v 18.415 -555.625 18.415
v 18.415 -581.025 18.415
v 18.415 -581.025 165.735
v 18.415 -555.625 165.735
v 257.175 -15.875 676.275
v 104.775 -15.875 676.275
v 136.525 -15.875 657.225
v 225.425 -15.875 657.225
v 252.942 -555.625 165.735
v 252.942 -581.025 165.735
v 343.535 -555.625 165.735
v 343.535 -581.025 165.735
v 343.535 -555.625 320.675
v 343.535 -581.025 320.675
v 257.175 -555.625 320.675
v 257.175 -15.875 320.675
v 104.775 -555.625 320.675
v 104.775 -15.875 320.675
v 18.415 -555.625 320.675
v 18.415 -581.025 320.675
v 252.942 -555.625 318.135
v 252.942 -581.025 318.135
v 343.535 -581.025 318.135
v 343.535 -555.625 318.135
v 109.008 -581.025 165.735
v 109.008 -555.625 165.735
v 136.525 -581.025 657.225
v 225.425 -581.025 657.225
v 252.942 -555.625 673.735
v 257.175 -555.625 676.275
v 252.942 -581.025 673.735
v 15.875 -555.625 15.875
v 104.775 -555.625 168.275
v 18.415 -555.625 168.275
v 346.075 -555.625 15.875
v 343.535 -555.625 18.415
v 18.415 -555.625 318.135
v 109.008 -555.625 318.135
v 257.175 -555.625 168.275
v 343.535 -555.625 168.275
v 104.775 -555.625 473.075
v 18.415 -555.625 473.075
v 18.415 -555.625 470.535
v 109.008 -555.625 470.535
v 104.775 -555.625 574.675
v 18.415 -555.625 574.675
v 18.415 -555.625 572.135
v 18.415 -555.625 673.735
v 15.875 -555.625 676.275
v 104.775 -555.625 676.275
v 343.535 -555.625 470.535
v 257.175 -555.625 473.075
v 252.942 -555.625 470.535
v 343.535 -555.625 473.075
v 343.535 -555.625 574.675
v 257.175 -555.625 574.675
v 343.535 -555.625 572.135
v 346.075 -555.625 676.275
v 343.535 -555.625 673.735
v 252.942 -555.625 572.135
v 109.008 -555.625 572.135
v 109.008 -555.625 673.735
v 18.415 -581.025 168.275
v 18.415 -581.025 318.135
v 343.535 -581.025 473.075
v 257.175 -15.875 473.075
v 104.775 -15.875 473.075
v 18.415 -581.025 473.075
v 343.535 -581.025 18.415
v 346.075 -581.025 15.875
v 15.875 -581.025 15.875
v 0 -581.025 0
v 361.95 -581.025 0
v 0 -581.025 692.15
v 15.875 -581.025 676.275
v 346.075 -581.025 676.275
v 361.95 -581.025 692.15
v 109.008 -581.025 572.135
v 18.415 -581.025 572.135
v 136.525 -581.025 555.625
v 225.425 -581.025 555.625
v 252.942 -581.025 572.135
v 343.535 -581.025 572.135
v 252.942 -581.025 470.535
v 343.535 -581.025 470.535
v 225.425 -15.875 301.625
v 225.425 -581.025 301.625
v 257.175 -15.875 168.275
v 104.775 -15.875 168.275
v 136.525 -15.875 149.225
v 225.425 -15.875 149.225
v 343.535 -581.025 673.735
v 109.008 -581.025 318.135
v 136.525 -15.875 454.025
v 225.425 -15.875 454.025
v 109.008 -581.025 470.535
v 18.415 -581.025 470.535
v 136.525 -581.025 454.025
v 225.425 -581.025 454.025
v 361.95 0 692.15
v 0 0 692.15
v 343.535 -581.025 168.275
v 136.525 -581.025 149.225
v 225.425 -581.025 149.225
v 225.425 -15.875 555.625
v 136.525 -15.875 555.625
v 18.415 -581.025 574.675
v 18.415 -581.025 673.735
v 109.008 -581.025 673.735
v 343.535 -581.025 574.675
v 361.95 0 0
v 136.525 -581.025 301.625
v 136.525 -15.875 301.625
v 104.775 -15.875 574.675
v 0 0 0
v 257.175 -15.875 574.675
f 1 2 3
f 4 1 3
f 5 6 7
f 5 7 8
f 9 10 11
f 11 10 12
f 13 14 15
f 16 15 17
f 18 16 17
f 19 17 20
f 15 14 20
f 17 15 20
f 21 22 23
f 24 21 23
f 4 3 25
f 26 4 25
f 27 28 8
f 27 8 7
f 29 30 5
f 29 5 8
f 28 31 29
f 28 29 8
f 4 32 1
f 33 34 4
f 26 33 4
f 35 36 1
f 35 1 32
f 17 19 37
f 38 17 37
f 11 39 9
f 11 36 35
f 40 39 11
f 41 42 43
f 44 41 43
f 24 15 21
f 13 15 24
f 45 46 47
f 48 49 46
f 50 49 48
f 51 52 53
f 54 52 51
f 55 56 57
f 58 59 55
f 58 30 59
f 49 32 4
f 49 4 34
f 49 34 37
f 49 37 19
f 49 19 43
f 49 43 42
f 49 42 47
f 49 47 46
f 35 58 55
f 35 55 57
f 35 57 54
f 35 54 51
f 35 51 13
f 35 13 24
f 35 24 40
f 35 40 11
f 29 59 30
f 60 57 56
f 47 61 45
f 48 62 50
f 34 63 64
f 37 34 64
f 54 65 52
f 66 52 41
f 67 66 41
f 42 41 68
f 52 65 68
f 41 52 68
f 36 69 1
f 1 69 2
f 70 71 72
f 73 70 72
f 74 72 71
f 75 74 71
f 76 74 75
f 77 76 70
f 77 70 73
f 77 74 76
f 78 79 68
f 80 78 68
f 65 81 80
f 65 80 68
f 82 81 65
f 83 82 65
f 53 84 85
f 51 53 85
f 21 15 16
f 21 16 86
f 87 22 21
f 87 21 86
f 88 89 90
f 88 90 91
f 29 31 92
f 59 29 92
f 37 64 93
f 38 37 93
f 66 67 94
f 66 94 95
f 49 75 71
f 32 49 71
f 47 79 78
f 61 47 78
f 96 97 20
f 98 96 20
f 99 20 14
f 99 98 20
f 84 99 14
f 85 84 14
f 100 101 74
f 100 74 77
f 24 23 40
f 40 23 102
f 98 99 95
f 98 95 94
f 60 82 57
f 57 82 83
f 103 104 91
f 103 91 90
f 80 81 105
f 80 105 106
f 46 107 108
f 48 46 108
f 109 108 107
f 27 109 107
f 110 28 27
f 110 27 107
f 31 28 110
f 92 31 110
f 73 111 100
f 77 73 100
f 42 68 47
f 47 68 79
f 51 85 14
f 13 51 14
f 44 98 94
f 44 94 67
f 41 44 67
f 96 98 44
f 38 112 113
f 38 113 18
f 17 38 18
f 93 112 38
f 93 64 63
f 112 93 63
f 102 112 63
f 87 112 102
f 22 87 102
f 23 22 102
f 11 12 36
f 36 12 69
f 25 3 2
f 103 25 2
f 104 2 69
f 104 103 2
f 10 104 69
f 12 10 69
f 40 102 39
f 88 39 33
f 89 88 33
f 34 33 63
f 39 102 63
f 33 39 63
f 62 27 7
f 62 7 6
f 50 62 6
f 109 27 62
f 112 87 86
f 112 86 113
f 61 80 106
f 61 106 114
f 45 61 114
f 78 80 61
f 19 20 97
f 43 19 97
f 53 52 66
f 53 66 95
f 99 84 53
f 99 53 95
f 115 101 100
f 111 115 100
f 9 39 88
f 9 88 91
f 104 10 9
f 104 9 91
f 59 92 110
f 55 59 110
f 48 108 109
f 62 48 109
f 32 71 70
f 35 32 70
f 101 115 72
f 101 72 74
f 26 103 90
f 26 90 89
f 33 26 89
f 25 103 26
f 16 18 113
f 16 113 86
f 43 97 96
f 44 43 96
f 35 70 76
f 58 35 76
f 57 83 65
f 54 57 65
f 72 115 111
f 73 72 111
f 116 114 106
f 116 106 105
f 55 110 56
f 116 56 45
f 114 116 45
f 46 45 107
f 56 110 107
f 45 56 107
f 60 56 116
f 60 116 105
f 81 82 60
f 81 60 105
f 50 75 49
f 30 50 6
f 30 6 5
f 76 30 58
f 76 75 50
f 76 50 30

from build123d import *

# Parameters (mm, degrees)
F0_W     = 361.95
F0_H     = 692.15
F1_DEPTH = 581.025
F2_W     = 330.2
F2_H     = 660.4
F3_DEPTH = 565.15
F5_DEPTH = 565.15
F7_DEPTH = 25.4


# Not quite as in the source:
# - a feature names something its author has since deleted; it is built from what else it names


with BuildPart() as f1:
    # F0 (on Front) → F1 (new body)
    with BuildSketch(Plane.XZ):
        with Locations((180.975, 346.075)):
            Rectangle(F0_W, F0_H)
    extrude(amount=F1_DEPTH)

    # F2 (on face) → F3 (cut)
    with BuildSketch(Plane.XZ.offset(581.025)):
        with Locations((180.975, 346.075)):
            Rectangle(F2_W, F2_H)
    extrude(amount=-F3_DEPTH, mode=Mode.SUBTRACT)

    # F4 (on face) → F5 (join)
    with BuildSketch(Plane.XZ.offset(581.025)):
        Polygon((104.775, 168.275), (15.875, 168.275), (15.875, 15.875), (346.075, 15.875), (346.075, 168.275), (257.175, 168.275), (225.425, 149.225), (136.525, 149.225), align=None)
        Polygon((104.775, 676.275), (15.875, 676.275), (15.875, 574.675), (104.775, 574.675), (257.175, 574.675), (346.075, 574.675), (346.075, 676.275), (257.175, 676.275), (225.425, 657.225), (136.525, 657.225), align=None)
        Polygon((104.775, 574.675), (15.875, 574.675), (15.875, 473.075), (104.775, 473.075), (257.175, 473.075), (346.075, 473.075), (346.075, 574.675), (257.175, 574.675), (225.425, 555.625), (136.525, 555.625), align=None)
        Polygon((104.775, 473.075), (15.875, 473.075), (15.875, 320.675), (104.775, 320.675), (257.175, 320.675), (346.075, 320.675), (346.075, 473.075), (257.175, 473.075), (225.425, 454.025), (136.525, 454.025), align=None)
        Polygon((104.775, 320.675), (15.875, 320.675), (15.875, 168.275), (104.775, 168.275), (257.175, 168.275), (346.075, 168.275), (346.075, 320.675), (257.175, 320.675), (225.425, 301.625), (136.525, 301.625), align=None)
    extrude(amount=-F5_DEPTH)

    # F6 (on face) → F7 (cut)
    with BuildSketch(Plane.XZ.offset(581.025)):
        Polygon((257.175, 676.275), (104.775, 676.275), (109.0083333333, 673.735), (252.9416666667, 673.735), align=None)
        Polygon((104.775, 676.275), (15.875, 676.275), (15.875, 15.875), (346.075, 15.875), (346.075, 676.275), (257.175, 676.275), (252.9416666667, 673.735), (343.535, 673.735), (343.535, 574.675), (343.535, 572.135), (343.535, 473.075), (343.535, 470.535), (343.535, 320.675), (343.535, 318.135), (343.535, 168.275), (343.535, 165.735), (343.535, 18.415), (18.415, 18.415), (18.415, 165.735), (18.415, 168.275), (18.415, 318.135), (18.415, 320.675), (18.415, 470.535), (18.415, 473.075), (18.415, 572.135), (18.415, 574.675), (18.415, 673.735), (109.0083333333, 673.735), align=None)
        Polygon((257.175, 574.675), (104.775, 574.675), (109.0083333333, 572.135), (252.9416666667, 572.135), align=None)
        Polygon((104.775, 574.675), (18.415, 574.675), (18.415, 572.135), (109.0083333333, 572.135), align=None)
        Polygon((343.535, 572.135), (343.535, 574.675), (257.175, 574.675), (252.9416666667, 572.135), align=None)
        Polygon((343.535, 470.535), (343.535, 473.075), (257.175, 473.075), (252.9416666667, 470.535), align=None)
        Polygon((257.175, 473.075), (104.775, 473.075), (109.0083333333, 470.535), (252.9416666667, 470.535), align=None)
        Polygon((104.775, 473.075), (18.415, 473.075), (18.415, 470.535), (109.0083333333, 470.535), align=None)
        Polygon((257.175, 320.675), (104.775, 320.675), (109.0083333333, 318.135), (252.9416666667, 318.135), align=None)
        Polygon((104.775, 320.675), (18.415, 320.675), (18.415, 318.135), (109.0083333333, 318.135), align=None)
        Polygon((343.535, 318.135), (343.535, 320.675), (257.175, 320.675), (252.9416666667, 318.135), align=None)
        Polygon((343.535, 165.735), (343.535, 168.275), (257.175, 168.275), (252.9416666667, 165.735), align=None)
        Polygon((108.4452420473, 168.275), (104.775, 168.275), (109.0083333333, 165.735), (252.9416666667, 165.735), (257.175, 168.275), align=None)
        Polygon((104.775, 168.275), (18.415, 168.275), (18.415, 165.735), (109.0083333333, 165.735), align=None)
    extrude(amount=-F7_DEPTH, mode=Mode.SUBTRACT)


solid = f1.part
